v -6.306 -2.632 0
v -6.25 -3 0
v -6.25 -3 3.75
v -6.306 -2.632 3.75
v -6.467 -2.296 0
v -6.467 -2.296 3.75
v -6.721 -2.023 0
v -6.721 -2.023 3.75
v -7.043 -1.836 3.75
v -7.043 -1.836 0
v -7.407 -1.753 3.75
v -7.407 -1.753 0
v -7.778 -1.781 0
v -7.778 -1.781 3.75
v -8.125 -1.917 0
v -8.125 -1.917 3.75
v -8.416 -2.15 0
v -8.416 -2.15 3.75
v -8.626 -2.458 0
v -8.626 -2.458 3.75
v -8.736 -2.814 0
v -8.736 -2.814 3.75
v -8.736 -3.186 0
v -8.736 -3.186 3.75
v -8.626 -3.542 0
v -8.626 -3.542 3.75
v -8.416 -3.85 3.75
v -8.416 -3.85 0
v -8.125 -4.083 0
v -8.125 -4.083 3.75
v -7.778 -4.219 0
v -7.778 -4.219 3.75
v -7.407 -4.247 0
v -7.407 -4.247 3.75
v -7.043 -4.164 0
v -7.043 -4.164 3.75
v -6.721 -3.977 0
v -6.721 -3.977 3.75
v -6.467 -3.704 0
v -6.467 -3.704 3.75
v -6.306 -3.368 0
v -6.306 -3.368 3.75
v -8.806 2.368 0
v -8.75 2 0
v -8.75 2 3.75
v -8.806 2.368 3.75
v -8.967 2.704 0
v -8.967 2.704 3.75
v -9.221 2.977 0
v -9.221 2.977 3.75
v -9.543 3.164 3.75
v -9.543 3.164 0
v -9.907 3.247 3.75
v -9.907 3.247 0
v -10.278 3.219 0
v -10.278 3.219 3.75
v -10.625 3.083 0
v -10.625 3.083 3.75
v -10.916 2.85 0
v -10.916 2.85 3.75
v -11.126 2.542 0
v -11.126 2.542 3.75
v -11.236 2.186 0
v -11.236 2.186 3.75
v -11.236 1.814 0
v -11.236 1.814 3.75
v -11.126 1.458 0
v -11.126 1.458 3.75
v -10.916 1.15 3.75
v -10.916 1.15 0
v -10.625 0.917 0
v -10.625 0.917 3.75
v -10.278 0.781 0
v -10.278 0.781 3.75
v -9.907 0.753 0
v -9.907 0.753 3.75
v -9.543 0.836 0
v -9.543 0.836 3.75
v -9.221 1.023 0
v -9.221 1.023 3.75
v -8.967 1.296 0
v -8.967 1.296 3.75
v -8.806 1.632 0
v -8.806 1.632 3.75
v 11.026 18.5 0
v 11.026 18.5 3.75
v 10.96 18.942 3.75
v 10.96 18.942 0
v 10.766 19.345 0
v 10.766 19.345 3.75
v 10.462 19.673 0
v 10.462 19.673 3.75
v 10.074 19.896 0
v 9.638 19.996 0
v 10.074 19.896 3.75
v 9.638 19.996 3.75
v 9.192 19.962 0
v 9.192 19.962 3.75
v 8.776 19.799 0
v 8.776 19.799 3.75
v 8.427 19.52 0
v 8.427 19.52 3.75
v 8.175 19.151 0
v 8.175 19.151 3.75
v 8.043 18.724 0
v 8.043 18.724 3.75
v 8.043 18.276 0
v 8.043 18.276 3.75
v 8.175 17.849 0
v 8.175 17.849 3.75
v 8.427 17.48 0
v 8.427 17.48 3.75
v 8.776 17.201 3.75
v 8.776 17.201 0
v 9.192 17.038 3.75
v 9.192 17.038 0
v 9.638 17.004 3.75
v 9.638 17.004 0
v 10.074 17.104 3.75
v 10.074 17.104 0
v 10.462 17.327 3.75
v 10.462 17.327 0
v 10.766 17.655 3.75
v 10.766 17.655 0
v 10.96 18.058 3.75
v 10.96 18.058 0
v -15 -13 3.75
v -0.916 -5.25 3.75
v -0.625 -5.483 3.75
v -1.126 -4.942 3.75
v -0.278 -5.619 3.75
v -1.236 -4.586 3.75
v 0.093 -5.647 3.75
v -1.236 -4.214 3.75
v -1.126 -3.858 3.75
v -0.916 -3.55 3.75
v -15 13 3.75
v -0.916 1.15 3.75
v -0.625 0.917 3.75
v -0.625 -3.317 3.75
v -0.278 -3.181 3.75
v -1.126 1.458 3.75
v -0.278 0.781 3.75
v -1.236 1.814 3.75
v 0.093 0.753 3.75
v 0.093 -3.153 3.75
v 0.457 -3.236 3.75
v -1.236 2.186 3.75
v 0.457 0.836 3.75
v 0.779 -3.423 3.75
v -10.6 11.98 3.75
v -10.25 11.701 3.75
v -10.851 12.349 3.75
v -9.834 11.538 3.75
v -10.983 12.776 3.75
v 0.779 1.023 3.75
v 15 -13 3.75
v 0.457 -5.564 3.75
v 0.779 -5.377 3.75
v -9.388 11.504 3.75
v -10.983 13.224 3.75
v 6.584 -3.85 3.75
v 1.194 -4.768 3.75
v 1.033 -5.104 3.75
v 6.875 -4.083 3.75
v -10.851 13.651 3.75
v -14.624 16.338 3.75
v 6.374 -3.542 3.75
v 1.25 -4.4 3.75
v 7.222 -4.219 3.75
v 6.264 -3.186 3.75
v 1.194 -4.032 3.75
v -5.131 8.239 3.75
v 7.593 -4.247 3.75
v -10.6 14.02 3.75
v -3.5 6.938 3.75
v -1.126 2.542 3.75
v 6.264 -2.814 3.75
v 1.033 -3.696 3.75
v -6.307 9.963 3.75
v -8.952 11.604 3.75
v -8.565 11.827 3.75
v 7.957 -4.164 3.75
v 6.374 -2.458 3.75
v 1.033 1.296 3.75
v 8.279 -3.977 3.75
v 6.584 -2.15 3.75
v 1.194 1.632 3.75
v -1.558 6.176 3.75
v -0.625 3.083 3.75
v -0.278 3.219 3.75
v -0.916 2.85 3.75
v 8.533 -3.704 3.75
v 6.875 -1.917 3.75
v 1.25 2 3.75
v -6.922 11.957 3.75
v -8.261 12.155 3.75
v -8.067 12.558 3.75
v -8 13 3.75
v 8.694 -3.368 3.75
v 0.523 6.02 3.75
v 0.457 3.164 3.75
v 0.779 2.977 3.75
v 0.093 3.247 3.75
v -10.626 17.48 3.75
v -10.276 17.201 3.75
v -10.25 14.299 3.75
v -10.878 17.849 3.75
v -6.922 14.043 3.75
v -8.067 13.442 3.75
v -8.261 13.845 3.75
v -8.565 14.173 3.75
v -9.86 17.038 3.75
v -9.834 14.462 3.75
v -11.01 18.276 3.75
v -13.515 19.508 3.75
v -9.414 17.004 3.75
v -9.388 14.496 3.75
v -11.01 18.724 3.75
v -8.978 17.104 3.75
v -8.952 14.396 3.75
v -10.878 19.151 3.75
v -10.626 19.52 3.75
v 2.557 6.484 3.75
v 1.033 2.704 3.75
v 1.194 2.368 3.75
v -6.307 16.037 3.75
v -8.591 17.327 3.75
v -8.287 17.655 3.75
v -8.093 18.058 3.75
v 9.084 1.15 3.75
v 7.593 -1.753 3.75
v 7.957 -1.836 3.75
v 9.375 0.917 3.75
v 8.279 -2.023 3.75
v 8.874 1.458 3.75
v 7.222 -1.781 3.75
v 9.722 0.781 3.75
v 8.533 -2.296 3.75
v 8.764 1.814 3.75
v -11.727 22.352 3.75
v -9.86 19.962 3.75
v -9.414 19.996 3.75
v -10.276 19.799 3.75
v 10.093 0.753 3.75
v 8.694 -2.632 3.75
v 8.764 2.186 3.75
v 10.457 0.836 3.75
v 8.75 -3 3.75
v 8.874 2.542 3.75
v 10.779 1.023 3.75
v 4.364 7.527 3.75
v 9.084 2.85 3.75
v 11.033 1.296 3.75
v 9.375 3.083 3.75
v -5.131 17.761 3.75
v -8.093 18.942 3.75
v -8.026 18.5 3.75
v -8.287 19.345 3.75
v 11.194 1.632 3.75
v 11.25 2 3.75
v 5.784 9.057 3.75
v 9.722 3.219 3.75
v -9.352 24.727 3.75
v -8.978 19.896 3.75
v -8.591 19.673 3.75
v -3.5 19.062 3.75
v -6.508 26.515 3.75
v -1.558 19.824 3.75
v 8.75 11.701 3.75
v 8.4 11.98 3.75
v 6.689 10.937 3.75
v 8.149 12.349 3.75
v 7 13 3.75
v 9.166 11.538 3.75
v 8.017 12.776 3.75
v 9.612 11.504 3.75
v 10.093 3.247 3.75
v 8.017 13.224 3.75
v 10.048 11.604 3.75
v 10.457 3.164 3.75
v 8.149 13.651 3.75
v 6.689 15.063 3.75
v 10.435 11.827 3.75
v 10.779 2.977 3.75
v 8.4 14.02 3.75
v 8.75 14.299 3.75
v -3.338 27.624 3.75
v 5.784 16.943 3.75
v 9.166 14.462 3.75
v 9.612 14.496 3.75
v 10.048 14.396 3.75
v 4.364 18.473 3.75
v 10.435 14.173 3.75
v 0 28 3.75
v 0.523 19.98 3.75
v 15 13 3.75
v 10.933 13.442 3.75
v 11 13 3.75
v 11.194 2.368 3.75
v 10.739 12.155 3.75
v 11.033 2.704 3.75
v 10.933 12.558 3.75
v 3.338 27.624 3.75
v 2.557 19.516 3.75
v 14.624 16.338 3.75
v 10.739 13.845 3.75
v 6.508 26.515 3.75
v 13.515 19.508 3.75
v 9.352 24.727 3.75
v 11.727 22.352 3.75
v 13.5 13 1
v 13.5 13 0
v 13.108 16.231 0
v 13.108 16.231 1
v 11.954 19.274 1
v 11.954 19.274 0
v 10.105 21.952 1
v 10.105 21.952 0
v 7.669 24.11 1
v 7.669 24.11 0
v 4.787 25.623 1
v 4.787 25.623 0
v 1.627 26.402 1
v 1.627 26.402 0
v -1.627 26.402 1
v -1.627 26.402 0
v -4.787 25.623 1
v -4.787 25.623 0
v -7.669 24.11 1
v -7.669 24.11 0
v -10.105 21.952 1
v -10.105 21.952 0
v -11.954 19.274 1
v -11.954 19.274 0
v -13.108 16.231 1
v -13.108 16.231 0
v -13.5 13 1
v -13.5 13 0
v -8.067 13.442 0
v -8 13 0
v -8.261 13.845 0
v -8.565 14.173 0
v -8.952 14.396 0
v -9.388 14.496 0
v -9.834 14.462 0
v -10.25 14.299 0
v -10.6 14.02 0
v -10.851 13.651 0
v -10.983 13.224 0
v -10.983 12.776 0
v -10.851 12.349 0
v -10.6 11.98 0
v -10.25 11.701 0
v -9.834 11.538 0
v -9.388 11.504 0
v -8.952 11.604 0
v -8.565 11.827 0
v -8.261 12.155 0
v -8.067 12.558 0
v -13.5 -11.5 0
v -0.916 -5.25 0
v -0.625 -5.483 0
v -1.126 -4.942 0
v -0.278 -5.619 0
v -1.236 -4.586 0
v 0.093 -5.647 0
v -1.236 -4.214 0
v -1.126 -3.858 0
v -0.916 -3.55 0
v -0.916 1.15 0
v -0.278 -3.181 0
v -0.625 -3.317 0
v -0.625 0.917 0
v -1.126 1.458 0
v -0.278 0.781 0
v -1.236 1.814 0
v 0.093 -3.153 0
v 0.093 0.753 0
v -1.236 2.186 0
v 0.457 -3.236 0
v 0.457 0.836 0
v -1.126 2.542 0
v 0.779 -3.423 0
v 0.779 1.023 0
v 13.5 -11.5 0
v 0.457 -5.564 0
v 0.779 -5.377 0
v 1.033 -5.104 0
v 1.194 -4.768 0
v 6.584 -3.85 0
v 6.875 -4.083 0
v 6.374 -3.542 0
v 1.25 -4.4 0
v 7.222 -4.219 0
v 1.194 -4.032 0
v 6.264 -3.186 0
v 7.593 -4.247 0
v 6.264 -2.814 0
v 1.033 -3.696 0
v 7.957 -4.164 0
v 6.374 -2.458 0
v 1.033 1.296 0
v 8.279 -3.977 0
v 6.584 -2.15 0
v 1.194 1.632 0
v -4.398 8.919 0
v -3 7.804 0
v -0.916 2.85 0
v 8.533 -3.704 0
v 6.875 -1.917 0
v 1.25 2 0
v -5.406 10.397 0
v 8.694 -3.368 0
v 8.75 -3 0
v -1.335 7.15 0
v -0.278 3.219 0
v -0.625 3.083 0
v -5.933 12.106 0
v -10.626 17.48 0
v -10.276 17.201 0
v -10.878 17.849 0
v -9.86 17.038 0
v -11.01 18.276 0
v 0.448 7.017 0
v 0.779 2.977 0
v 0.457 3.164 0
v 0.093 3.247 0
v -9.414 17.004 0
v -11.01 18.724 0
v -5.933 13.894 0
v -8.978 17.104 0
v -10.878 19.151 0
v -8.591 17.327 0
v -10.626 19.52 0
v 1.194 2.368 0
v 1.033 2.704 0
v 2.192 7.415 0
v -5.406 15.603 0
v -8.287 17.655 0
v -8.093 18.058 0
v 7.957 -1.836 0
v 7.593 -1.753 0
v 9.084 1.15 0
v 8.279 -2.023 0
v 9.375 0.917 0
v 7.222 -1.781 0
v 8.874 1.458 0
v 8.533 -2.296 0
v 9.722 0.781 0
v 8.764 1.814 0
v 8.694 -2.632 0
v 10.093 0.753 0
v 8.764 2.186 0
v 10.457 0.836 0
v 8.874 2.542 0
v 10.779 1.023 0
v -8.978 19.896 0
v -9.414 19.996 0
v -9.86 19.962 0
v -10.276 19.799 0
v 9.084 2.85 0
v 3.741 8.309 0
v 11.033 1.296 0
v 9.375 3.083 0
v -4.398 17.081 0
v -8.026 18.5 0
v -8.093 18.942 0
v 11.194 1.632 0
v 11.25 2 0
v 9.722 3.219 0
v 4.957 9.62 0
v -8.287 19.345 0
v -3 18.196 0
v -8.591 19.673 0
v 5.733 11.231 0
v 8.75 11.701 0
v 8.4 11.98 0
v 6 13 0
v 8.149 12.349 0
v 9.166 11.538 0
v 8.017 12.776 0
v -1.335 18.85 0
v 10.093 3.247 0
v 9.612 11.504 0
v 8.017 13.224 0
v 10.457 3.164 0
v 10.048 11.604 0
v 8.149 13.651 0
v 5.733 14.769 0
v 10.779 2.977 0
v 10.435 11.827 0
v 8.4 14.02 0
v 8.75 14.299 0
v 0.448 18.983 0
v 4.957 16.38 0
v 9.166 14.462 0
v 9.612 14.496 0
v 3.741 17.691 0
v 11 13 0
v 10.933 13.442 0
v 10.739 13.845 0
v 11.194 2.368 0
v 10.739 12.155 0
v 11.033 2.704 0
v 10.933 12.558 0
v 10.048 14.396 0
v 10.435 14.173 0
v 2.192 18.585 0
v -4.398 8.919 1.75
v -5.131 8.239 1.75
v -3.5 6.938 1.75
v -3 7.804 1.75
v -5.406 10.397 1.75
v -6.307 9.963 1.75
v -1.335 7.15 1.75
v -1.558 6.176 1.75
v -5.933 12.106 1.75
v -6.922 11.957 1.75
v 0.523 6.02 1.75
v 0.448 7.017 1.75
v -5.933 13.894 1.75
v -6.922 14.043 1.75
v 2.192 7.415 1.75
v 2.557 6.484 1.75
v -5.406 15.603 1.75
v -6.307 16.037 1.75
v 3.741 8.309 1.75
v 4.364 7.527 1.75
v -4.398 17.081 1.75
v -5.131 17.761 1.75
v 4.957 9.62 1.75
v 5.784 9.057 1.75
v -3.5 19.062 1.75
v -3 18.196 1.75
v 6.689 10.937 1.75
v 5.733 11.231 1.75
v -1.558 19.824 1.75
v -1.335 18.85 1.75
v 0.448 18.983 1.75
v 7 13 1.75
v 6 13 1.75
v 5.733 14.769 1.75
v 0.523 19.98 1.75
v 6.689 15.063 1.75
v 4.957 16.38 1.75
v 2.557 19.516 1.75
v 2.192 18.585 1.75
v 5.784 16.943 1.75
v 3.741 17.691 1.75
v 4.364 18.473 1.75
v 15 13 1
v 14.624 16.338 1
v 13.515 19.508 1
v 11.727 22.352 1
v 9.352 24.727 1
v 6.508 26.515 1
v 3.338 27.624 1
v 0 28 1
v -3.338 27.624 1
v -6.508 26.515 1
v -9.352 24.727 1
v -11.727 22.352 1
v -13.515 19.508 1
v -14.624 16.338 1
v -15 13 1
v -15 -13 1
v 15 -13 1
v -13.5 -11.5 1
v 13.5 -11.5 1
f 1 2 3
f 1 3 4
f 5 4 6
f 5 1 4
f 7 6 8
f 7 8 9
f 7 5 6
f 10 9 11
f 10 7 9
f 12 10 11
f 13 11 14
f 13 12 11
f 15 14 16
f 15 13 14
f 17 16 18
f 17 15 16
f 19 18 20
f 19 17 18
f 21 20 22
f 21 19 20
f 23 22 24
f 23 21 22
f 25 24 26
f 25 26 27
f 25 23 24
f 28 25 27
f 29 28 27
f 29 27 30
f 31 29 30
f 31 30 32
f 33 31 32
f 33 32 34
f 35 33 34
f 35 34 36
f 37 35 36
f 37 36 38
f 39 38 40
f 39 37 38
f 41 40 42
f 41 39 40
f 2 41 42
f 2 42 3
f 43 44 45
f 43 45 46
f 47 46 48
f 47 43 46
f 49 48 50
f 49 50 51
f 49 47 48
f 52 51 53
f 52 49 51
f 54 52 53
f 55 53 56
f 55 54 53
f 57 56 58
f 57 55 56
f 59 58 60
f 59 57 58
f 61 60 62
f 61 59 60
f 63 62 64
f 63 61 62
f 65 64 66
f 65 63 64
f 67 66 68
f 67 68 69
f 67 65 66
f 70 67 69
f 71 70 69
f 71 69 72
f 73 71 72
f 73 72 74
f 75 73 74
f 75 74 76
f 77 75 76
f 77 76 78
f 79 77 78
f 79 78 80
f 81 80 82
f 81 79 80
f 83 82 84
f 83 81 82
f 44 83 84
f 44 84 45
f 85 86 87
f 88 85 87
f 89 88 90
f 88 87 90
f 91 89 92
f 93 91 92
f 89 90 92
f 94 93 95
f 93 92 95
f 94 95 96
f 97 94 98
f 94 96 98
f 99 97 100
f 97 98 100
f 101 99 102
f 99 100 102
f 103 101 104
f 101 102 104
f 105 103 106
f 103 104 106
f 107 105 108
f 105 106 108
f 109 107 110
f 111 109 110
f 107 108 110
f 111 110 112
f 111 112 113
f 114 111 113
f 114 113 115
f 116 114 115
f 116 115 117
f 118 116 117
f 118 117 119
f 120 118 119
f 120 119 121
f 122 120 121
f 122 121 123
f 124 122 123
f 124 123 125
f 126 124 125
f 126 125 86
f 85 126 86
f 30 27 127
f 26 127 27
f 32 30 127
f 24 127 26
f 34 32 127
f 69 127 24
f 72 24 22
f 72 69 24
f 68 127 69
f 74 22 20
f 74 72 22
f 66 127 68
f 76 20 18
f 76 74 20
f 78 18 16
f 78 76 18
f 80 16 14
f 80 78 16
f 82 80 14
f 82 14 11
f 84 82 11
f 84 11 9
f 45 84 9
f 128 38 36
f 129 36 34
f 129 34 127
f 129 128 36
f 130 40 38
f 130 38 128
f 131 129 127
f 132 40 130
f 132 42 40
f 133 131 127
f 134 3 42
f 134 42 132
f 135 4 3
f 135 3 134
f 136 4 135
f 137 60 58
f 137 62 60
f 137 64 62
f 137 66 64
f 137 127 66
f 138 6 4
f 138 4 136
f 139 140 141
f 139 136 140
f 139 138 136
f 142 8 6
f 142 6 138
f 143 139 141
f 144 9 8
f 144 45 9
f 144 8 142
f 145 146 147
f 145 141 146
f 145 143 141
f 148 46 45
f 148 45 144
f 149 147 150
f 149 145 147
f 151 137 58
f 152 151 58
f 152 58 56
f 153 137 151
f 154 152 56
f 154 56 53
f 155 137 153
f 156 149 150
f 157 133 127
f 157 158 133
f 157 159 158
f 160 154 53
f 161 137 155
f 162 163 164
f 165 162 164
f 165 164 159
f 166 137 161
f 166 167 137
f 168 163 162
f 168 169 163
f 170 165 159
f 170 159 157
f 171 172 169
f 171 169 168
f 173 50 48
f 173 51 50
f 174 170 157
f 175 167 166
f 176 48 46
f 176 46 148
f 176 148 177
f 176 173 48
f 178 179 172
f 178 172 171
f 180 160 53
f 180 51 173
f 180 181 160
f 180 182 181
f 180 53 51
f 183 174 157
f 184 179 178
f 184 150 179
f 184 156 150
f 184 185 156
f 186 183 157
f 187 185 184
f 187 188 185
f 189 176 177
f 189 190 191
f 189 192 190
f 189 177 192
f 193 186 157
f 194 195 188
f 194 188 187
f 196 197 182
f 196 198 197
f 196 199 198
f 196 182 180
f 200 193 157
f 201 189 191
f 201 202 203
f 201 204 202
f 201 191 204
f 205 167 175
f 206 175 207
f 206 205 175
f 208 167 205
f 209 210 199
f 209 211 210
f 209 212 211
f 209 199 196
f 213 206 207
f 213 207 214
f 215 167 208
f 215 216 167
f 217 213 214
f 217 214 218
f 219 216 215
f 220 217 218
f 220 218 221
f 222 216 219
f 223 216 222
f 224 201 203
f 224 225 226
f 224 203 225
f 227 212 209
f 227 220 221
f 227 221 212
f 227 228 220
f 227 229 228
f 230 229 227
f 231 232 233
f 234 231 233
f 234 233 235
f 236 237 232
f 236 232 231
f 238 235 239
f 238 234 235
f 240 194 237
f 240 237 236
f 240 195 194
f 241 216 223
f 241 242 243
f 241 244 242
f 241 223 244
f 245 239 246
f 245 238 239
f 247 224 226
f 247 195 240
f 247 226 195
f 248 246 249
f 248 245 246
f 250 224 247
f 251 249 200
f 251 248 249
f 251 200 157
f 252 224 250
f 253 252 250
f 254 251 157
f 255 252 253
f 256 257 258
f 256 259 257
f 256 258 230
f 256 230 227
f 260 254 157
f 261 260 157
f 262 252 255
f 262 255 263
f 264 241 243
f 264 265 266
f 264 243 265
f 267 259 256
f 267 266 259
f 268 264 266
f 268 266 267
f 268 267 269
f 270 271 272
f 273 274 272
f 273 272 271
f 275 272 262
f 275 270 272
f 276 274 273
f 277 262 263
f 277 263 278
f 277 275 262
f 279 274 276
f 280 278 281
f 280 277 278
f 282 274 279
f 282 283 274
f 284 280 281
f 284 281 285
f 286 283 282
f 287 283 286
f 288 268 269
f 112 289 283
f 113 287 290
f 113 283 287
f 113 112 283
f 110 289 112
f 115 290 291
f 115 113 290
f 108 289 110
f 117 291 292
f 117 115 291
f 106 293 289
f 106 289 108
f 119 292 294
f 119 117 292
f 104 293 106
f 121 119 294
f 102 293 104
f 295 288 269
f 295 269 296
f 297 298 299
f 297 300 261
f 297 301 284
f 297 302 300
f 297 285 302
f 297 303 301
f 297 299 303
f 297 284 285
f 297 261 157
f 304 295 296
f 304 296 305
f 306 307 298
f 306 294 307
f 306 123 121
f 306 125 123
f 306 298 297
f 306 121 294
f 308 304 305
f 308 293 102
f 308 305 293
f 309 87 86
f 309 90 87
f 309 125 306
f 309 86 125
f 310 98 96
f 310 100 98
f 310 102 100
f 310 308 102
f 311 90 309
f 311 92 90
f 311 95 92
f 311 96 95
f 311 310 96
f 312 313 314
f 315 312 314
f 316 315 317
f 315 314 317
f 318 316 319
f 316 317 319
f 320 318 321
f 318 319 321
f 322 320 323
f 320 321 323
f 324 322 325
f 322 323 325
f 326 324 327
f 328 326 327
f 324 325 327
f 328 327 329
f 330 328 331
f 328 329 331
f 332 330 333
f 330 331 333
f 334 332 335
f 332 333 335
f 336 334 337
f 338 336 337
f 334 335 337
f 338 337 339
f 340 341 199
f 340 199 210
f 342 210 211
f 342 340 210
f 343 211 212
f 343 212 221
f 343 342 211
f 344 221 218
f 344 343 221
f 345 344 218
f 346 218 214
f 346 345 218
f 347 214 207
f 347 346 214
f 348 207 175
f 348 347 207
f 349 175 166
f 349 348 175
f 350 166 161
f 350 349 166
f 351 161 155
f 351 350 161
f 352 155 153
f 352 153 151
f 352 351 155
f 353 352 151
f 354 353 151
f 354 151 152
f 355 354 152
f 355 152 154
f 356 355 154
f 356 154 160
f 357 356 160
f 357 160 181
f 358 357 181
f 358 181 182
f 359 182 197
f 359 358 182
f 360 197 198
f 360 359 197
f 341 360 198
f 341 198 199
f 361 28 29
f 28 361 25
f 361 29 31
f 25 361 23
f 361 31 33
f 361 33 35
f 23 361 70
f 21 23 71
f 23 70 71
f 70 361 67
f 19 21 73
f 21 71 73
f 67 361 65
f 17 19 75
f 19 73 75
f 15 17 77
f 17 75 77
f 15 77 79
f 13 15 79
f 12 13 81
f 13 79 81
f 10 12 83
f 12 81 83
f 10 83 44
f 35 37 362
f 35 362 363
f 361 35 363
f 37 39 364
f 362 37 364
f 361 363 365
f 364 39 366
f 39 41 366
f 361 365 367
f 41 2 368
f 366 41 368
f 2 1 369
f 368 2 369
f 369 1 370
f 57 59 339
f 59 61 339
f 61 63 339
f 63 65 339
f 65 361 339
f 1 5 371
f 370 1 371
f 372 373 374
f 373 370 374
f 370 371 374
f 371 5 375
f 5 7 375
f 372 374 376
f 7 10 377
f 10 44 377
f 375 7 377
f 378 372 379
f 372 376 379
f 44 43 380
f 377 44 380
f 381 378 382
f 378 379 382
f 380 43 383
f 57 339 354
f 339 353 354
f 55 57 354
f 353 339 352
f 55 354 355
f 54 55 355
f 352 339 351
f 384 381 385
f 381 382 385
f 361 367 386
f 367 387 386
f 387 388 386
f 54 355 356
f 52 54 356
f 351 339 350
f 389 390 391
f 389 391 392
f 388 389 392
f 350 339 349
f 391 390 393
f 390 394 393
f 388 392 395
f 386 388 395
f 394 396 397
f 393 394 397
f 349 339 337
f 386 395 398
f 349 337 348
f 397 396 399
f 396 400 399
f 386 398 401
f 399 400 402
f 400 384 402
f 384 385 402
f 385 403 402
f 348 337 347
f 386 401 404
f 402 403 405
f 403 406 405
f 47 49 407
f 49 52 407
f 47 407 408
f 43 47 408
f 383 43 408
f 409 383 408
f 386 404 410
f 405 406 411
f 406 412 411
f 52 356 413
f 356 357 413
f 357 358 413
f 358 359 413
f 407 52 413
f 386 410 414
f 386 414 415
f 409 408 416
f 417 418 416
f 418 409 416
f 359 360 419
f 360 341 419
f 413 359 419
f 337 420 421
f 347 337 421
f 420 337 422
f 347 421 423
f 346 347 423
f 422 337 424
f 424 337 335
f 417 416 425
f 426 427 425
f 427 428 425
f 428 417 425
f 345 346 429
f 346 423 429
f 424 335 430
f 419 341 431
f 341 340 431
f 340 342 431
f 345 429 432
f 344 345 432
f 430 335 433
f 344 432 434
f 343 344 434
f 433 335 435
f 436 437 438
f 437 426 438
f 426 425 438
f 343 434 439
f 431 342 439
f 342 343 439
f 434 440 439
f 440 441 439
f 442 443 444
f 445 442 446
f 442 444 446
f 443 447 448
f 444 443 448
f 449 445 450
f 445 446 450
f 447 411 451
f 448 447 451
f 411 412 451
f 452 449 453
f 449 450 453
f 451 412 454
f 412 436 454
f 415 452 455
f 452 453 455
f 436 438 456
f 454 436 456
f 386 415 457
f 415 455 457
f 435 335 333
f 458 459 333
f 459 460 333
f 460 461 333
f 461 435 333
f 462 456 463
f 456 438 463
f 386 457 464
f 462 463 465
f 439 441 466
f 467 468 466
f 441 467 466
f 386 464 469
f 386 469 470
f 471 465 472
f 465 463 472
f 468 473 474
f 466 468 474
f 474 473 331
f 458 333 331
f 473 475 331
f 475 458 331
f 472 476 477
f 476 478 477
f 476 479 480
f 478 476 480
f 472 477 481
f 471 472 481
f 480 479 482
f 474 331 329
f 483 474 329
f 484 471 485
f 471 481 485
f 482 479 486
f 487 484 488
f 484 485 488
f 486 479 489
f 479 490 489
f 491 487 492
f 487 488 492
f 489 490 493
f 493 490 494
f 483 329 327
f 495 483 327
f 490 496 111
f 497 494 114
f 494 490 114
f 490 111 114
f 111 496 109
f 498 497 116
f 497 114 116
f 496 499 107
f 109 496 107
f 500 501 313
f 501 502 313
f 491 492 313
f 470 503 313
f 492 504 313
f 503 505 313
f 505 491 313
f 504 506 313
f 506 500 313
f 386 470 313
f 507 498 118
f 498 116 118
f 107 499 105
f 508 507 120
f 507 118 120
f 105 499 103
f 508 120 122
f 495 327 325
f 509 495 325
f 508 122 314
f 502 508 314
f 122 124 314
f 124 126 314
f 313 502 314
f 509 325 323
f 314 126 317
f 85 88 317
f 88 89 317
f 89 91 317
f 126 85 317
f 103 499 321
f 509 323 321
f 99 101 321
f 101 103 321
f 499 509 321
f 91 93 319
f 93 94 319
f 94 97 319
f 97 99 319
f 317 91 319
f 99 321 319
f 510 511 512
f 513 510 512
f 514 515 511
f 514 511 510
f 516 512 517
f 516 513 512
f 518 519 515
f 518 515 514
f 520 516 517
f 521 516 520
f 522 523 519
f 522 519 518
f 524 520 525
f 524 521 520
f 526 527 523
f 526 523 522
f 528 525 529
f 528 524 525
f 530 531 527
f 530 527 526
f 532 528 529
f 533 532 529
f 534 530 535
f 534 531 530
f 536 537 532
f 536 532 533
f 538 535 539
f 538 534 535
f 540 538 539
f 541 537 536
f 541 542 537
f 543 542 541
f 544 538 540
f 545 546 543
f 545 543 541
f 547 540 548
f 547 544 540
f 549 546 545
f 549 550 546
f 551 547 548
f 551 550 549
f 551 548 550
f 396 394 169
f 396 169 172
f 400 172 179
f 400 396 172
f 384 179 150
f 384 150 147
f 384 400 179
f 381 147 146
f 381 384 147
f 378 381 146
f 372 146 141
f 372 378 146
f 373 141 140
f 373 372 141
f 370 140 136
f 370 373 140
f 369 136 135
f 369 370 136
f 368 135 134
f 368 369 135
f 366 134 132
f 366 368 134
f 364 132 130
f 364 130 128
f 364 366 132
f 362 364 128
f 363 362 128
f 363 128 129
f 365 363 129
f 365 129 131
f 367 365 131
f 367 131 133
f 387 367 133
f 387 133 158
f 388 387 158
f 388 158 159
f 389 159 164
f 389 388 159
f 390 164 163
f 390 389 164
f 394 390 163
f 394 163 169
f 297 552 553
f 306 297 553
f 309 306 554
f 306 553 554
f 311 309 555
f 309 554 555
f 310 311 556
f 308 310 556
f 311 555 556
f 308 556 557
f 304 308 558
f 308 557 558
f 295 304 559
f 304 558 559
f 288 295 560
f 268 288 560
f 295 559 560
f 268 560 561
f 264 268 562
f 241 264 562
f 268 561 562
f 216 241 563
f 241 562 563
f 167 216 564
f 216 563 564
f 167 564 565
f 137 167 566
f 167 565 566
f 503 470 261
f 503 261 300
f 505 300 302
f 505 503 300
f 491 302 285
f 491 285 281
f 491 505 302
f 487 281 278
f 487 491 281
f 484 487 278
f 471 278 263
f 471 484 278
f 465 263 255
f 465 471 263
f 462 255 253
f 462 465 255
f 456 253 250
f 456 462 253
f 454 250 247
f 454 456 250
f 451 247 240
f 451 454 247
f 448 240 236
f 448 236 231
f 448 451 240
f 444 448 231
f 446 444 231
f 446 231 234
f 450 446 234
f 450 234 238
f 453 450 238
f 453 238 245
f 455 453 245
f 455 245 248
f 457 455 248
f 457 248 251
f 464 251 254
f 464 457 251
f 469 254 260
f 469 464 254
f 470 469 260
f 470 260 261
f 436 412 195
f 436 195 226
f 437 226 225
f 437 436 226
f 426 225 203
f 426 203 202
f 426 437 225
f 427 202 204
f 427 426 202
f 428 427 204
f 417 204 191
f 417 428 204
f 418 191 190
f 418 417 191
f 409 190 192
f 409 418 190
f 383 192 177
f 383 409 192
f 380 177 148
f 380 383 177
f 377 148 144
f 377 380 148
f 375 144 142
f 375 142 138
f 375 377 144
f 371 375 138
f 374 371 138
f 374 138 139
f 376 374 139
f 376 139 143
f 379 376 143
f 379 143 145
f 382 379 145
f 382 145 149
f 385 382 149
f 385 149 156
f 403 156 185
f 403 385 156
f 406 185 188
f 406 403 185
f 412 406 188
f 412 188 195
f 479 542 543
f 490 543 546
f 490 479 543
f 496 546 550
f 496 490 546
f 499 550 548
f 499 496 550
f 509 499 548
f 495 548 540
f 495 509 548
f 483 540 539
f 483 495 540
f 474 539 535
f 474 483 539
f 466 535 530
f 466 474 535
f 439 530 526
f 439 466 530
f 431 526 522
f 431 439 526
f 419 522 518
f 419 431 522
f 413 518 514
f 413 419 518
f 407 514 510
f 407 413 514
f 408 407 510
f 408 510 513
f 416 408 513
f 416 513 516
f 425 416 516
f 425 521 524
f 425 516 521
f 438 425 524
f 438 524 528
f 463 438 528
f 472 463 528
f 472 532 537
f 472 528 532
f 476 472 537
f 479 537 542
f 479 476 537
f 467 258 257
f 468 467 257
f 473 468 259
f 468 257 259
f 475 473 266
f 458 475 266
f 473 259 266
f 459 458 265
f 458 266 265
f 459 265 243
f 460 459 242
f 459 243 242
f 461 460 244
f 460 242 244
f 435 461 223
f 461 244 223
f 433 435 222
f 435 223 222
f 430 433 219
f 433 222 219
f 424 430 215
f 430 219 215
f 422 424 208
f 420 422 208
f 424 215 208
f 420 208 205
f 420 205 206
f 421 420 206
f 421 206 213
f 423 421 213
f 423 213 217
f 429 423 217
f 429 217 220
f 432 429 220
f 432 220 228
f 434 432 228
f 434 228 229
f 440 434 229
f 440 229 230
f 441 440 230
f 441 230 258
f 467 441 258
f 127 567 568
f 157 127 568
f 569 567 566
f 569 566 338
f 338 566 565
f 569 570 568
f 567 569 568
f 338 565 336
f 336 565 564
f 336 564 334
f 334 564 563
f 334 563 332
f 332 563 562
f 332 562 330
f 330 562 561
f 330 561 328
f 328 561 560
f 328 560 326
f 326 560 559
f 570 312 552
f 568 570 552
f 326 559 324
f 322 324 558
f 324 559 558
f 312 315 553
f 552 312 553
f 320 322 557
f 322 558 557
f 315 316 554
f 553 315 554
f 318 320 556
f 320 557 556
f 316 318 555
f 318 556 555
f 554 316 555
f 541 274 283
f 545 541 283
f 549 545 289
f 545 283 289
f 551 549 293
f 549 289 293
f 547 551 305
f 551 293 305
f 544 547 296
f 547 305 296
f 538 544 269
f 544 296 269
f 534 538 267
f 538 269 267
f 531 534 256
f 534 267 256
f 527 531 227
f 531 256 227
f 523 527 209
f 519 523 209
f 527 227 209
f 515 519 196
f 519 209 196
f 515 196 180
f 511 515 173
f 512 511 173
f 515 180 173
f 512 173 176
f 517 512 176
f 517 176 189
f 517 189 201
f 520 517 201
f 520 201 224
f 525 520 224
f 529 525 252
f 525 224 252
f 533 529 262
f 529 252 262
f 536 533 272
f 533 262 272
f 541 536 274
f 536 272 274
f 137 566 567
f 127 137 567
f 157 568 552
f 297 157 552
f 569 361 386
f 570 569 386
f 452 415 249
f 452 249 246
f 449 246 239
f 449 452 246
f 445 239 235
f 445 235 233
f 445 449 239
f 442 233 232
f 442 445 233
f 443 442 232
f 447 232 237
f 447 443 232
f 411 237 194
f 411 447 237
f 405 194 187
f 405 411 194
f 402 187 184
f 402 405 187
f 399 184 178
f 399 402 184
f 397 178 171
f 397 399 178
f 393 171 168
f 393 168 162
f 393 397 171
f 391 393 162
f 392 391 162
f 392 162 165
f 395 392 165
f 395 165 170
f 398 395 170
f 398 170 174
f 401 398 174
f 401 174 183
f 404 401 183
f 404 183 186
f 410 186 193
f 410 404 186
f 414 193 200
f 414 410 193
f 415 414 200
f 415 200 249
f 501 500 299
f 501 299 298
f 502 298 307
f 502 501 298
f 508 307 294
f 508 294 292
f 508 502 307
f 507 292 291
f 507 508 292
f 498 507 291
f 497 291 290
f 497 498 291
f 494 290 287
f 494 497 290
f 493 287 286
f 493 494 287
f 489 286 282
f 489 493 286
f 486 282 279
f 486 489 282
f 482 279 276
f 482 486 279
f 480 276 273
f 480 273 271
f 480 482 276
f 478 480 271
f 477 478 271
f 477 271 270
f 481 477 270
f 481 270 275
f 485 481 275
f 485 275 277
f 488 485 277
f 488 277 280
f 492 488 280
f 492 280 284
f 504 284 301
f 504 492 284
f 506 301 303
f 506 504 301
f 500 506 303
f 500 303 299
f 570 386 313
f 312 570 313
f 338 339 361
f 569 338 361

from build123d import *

# Parameters (mm, degrees)
SKETCH1_R           = 6
SKETCH1_R_2         = 1.5
SKETCH1_R_3         = 1.25
BOSS_EXTRUDE1_DEPTH = 3.75
SKETCH2_R           = 7
CUT_EXTRUDE1_DEPTH  = 2
CUT_EXTRUDE2_DEPTH  = 1
SKETCH4_R           = 1.5
CUT_EXTRUDE3_DEPTH  = 10


with BuildPart() as part:
    # Sketch1 → Boss-Extrude1 (new body)
    with BuildSketch(Plane.XY):
        with BuildLine():
            Line((-14.999999511, 12.999998728), (-14.999999511, -12.999999576))
            Line((-14.999999511, -12.999999576), (15.000000489, -12.999999576))
            Line((15.000000489, -12.999999576), (15.000000489, 13.000000424))
            ThreePointArc((15.000000489, 13.000000424), (-3.59e-07, 28), (-14.999999511, 12.999998728))
        make_face()
        with Locations((4.89e-07, 13)):
            Circle(SKETCH1_R, mode=Mode.SUBTRACT)
        with Locations((-9.499999511, 13)):
            Circle(SKETCH1_R_2, mode=Mode.SUBTRACT)
        with Locations((9.500000489, 13)):
            Circle(SKETCH1_R_2, mode=Mode.SUBTRACT)
        with Locations((-7.5, -3)):
            Circle(SKETCH1_R_3, mode=Mode.SUBTRACT)
        with Locations((7.5, -3)):
            Circle(SKETCH1_R_3, mode=Mode.SUBTRACT)
        with Locations((10.000000489, 2)):
            Circle(SKETCH1_R_3, mode=Mode.SUBTRACT)
        with Locations((-9.999999511, 2)):
            Circle(SKETCH1_R_3, mode=Mode.SUBTRACT)
        with Locations((0, 2)):
            Circle(SKETCH1_R_3, mode=Mode.SUBTRACT)
        with Locations((0, -4.4)):
            Circle(SKETCH1_R_3, mode=Mode.SUBTRACT)
    extrude(amount=BOSS_EXTRUDE1_DEPTH)

    # Sketch2 → Cut-Extrude1 (cut)
    with BuildSketch(Plane.XY.offset(3.75)):
        with Locations((4.89e-07, 13)):
            Circle(SKETCH2_R)
    extrude(amount=-CUT_EXTRUDE1_DEPTH, mode=Mode.SUBTRACT)

    # Sketch3 → Cut-Extrude2 (cut)
    with BuildSketch(Plane.XY):
        with BuildLine():
            Line((15.000000489, -12.999999576), (15.000000489, 13.000000424))
            ThreePointArc((15.000000489, 13.000000424), (-3.59e-07, 28), (-14.999999511, 12.999998728))
            Line((-14.999999511, 12.999998728), (-14.999999511, -12.999999576))
            Line((-14.999999511, -12.999999576), (15.000000489, -12.999999576))
        make_face()
        with BuildLine():
            Line((-13.499999511, 12.999998855), (-13.499999511, -11.499999576))
            Line((-13.499999511, -11.499999576), (13.500000489, -11.499999576))
            Line((13.500000489, -11.499999576), (13.500000489, 13.000000382))
            ThreePointArc((13.500000489, 13.000000382), (-2.74e-07, 26.5), (-13.499999511, 12.999998855))
        make_face(mode=Mode.SUBTRACT)
    extrude(amount=CUT_EXTRUDE2_DEPTH, mode=Mode.SUBTRACT)

    # Sketch4 → Cut-Extrude3 (cut)
    with BuildSketch(Plane.XY.offset(3.75)):
        with Locations((-9.526278952, 18.5)):
            Circle(SKETCH4_R)
        with Locations((9.526280345, 18.499999283)):
            Circle(SKETCH4_R)
    extrude(amount=-CUT_EXTRUDE3_DEPTH, mode=Mode.SUBTRACT)


solid = part.part
